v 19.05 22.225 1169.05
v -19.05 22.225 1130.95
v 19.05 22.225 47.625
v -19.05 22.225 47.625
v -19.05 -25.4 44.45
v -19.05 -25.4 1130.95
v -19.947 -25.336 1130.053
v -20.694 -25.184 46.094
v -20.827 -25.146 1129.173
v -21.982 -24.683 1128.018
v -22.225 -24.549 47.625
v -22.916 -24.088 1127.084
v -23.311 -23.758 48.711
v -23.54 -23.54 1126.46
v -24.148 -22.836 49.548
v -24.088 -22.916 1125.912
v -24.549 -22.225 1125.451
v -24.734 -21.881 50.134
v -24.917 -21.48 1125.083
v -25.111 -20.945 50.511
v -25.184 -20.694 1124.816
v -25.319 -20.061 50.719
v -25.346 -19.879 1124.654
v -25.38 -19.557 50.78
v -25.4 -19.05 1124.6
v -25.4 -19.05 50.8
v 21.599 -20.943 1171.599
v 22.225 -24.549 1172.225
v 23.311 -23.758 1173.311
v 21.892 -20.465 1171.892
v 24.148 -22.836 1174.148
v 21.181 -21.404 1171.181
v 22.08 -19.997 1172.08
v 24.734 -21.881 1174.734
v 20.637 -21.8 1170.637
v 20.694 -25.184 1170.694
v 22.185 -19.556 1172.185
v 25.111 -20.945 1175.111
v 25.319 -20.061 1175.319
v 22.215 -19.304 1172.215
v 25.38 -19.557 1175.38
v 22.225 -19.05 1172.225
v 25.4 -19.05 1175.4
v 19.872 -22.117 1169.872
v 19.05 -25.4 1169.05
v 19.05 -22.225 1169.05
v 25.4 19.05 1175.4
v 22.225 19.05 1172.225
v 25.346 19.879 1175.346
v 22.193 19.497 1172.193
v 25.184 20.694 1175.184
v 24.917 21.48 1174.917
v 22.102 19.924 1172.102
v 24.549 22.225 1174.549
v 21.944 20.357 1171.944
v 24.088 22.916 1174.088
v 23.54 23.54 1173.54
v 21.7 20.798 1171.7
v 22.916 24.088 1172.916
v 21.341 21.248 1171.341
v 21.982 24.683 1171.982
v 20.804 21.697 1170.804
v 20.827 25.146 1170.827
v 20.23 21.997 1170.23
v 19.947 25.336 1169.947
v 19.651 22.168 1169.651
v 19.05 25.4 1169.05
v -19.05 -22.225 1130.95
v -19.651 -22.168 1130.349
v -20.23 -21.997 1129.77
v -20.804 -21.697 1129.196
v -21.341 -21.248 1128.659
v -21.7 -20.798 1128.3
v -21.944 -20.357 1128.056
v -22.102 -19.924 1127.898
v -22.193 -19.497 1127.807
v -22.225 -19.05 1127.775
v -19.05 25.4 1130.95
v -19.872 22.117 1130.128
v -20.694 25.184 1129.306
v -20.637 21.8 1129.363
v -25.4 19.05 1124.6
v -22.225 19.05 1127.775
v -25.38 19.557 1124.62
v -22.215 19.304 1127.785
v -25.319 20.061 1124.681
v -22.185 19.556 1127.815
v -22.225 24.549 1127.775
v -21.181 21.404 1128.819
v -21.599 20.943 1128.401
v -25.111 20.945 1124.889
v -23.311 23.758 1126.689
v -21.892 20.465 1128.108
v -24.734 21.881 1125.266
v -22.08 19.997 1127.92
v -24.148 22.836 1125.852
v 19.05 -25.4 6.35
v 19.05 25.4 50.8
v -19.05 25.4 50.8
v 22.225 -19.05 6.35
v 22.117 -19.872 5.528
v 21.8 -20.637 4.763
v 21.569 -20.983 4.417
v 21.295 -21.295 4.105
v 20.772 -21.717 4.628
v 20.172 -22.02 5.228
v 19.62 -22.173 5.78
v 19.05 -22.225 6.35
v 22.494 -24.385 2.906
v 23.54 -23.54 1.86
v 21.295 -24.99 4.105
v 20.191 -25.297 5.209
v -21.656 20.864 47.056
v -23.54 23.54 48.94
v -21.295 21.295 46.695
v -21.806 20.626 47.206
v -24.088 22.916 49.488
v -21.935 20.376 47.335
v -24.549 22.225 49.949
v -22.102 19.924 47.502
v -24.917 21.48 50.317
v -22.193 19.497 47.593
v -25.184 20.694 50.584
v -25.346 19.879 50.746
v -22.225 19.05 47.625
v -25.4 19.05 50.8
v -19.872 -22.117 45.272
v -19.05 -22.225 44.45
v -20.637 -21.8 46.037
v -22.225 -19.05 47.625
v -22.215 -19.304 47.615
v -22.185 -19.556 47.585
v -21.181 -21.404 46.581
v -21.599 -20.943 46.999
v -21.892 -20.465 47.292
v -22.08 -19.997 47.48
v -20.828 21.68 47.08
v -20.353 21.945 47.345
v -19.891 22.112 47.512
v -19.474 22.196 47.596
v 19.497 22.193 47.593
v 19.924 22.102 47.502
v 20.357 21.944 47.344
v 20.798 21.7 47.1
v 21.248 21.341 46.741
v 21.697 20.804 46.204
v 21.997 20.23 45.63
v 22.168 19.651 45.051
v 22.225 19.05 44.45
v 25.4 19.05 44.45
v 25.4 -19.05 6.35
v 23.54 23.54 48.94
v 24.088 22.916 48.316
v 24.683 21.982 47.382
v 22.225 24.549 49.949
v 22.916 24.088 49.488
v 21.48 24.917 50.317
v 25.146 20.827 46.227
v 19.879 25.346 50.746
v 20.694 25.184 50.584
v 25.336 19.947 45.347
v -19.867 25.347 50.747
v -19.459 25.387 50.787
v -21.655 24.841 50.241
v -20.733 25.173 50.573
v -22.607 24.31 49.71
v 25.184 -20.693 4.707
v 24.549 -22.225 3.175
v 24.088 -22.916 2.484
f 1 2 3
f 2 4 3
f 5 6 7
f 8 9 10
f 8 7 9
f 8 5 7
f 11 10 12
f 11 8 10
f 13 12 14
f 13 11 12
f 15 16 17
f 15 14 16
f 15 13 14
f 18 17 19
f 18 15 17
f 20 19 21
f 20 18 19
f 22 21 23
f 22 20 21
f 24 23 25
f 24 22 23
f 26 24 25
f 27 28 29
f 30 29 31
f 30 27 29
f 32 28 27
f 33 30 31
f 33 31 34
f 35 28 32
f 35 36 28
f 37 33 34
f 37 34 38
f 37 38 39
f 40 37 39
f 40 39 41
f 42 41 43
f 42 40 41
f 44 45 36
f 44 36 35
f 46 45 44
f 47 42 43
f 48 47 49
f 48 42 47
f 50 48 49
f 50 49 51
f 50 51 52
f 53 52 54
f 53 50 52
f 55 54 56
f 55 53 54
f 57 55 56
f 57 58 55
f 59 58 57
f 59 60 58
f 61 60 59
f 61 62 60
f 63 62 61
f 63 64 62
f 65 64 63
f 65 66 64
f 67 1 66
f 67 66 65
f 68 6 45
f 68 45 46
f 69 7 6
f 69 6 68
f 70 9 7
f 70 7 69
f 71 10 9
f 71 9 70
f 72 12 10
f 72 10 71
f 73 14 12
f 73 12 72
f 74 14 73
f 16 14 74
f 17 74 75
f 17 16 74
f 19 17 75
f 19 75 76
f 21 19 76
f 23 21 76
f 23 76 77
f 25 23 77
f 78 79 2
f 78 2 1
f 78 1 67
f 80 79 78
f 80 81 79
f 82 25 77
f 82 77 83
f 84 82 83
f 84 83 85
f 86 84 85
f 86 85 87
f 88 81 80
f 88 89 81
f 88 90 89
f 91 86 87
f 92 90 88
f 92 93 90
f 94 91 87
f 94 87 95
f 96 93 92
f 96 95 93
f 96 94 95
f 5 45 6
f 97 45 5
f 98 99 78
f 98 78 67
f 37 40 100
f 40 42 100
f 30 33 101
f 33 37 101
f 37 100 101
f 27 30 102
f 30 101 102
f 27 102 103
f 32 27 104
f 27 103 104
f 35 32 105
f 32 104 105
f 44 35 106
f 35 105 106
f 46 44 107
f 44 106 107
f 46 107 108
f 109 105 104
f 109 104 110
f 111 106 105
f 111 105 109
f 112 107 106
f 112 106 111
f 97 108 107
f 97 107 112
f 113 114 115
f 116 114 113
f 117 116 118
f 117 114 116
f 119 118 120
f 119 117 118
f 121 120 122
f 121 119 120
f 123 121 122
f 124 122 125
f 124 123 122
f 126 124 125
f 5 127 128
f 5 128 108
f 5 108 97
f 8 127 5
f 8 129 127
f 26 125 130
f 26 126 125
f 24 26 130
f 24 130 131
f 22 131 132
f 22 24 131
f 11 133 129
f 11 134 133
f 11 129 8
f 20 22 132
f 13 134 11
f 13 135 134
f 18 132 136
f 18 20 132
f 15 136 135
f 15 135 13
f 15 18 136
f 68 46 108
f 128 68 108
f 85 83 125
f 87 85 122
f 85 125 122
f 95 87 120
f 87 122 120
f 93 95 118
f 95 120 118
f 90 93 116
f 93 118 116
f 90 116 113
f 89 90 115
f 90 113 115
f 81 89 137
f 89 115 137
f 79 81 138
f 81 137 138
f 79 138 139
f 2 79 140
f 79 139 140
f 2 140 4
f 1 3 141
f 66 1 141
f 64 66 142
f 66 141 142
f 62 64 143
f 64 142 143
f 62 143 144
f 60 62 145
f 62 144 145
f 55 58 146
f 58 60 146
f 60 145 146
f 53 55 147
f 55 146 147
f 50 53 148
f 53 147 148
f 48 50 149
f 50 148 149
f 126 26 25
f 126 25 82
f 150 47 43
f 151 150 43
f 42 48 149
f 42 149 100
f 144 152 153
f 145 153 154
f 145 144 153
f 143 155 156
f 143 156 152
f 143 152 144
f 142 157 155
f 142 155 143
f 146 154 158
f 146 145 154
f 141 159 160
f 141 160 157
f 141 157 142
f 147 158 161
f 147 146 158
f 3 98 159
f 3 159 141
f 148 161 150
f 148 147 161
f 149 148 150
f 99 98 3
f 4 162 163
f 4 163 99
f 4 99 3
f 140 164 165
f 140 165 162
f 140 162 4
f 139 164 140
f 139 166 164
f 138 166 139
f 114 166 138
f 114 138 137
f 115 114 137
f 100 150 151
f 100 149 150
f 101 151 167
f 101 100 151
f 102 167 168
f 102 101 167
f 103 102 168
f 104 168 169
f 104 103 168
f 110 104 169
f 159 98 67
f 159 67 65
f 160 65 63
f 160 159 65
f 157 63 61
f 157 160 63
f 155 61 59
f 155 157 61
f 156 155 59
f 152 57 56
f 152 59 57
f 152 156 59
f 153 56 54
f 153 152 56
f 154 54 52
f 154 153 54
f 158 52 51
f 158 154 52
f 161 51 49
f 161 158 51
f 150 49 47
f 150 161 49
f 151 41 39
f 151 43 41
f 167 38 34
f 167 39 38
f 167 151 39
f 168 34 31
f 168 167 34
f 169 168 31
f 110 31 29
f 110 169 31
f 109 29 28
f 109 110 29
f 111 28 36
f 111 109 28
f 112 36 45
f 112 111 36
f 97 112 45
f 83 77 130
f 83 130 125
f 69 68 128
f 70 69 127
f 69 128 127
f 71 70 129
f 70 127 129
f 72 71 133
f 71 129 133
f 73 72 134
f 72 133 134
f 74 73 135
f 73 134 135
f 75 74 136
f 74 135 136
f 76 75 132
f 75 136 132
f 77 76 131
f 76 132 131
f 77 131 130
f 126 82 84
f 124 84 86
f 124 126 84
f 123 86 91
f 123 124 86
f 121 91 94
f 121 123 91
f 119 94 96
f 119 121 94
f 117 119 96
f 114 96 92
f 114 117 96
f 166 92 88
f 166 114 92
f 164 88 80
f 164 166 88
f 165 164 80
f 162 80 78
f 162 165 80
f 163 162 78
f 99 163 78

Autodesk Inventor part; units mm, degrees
ref_plane "Plano inicial" through (0, 0, 1.8599) normal (0, 0, 1) x (1, 0, 0)
ref_plane "Plano final" through (0, 0, 1175.4) normal (0, 0, 1) x (1, 0, 0)
sketch "Boceto" plane through (0, 0, 0) normal (0, 0, 1) x (1, 0, 0)
  line L0 (-25.4, -19.05) -> (-25.4, 19.05)
  line L1 (-19.05, 25.4) -> (19.05, 25.4)
  line L2 (25.4, 19.05) -> (25.4, -19.05)
  line L3 (19.05, -25.4) -> (-19.05, -25.4)
  arc A0 (-25.4, -19.05) -> (-19.05, -25.4) centre (-19.05, -19.05) ccw
  arc A1 (-19.05, 25.4) -> (-25.4, 19.05) centre (-19.05, 19.05) ccw
  arc A2 (25.4, 19.05) -> (19.05, 25.4) centre (19.05, 19.05) ccw
  arc A3 (19.05, -25.4) -> (25.4, -19.05) centre (19.05, -19.05) ccw
  arc A4 (-19.05, 22.225) -> (-22.225, 19.05) centre (-19.05, 19.05) ccw
  line L4 (-19.05, 22.225) -> (19.05, 22.225)
  arc A5 (22.225, 19.05) -> (19.05, 22.225) centre (19.05, 19.05) ccw
  line L5 (22.225, 19.05) -> (22.225, -19.05)
  arc A6 (19.05, -22.225) -> (22.225, -19.05) centre (19.05, -19.05) ccw
  line L6 (19.05, -22.225) -> (-19.05, -22.225)
  arc A7 (-22.225, -19.05) -> (-19.05, -22.225) centre (-19.05, -19.05) ccw
  line L7 (-22.225, -19.05) -> (-22.225, 19.05)
  line L8 (0, 37.4012) -> (0, -37.4012) construction
  line L9 (-37.4012, 0) -> (37.4012, 0) construction
  dimension "d10" = 50.8
  dimension "d11" = 50.8
  dimension "d12" = 3.175
  dimension "d15" = 25.4
  dimension "d16" = 25.4
  dimension "d17" = 6.35
extrude "Cuerpo" add sketch "Boceto" along normal up to surface (1173.5401 mm away) from surface at 1.8599
sketch "Sketch3" plane through (0, 0, 0) normal (0, 0, 1) x (1, 0, 0)
  line L0 (0, 0) -> (10, 0)
ref_plane "Work Plane3" through (0, 0, 0) normal (0, -1, 0) x (1, 0, 0)
ref_plane "Plano de trabajo4" through (25.4, 0, 1175.4) normal (-0.7071, 0, 0.7071) x (0.7071, 0, 0.7071)
split "Dividir1" plane through (25.4, 0, 1175.4) removes the side toward (-0.7071, 0, 0.7071)
ref_plane "Plano de trabajo5" through (0, -25.4, 0) normal (0, 0.7071, -0.7071) x (1, 0, 0)
split "Dividir2" plane through (0, -25.4, 0) removes the side toward (0, 0.7071, -0.7071)
ref_plane "Plano de trabajo6" through (25.4, 0, 0) normal (-0.7071, 0, -0.7071) x (-0.7071, 0, 0.7071)
split "Dividir3" plane through (25.4, 0, 0) removes the side toward (-0.7071, 0, -0.7071)
sketch "Sketch4" plane through (0, 0, 0) normal (0, -1, 0) x (1, 0, 0)
  line L0 (-2, 1.8599) -> (12, 1.8599) projected
  line L1 (-2, 1175.4) -> (12, 1175.4) projected
  dimension "d19" = 1173.5401
equation "\"d10\" = G_H"
equation "\"d11\" = G_W"
equation "\"d12\" = G_T"
equation "\"d15\" = 0.5 * d10"
equation "\"d16\" = 0.5 * d11"
equation "\"d17\" = G_IR"
equation "\"d3\" = G_L"
equation "\"G_W\" = 50.8"
equation "\"G_H\" = 50.8"
equation "\"G_T\" = 3.175"
equation "\"G_IR\" = 6.35"
equation "\"G_L\" = d19"
equation "\"G_OFFSET_START\" = -1.85987"
equation "\"G_OFFSET_END\" = 25.4"
equation "\"d13\" = -G_OFFSET_START"
equation "\"d14\" = G_OFFSET_END + B_L"
equation "\"B_L\" = 1150"
properties part number "AISC - 2 x 2 x 1/8 - 46,202" material "Acero, suave"
